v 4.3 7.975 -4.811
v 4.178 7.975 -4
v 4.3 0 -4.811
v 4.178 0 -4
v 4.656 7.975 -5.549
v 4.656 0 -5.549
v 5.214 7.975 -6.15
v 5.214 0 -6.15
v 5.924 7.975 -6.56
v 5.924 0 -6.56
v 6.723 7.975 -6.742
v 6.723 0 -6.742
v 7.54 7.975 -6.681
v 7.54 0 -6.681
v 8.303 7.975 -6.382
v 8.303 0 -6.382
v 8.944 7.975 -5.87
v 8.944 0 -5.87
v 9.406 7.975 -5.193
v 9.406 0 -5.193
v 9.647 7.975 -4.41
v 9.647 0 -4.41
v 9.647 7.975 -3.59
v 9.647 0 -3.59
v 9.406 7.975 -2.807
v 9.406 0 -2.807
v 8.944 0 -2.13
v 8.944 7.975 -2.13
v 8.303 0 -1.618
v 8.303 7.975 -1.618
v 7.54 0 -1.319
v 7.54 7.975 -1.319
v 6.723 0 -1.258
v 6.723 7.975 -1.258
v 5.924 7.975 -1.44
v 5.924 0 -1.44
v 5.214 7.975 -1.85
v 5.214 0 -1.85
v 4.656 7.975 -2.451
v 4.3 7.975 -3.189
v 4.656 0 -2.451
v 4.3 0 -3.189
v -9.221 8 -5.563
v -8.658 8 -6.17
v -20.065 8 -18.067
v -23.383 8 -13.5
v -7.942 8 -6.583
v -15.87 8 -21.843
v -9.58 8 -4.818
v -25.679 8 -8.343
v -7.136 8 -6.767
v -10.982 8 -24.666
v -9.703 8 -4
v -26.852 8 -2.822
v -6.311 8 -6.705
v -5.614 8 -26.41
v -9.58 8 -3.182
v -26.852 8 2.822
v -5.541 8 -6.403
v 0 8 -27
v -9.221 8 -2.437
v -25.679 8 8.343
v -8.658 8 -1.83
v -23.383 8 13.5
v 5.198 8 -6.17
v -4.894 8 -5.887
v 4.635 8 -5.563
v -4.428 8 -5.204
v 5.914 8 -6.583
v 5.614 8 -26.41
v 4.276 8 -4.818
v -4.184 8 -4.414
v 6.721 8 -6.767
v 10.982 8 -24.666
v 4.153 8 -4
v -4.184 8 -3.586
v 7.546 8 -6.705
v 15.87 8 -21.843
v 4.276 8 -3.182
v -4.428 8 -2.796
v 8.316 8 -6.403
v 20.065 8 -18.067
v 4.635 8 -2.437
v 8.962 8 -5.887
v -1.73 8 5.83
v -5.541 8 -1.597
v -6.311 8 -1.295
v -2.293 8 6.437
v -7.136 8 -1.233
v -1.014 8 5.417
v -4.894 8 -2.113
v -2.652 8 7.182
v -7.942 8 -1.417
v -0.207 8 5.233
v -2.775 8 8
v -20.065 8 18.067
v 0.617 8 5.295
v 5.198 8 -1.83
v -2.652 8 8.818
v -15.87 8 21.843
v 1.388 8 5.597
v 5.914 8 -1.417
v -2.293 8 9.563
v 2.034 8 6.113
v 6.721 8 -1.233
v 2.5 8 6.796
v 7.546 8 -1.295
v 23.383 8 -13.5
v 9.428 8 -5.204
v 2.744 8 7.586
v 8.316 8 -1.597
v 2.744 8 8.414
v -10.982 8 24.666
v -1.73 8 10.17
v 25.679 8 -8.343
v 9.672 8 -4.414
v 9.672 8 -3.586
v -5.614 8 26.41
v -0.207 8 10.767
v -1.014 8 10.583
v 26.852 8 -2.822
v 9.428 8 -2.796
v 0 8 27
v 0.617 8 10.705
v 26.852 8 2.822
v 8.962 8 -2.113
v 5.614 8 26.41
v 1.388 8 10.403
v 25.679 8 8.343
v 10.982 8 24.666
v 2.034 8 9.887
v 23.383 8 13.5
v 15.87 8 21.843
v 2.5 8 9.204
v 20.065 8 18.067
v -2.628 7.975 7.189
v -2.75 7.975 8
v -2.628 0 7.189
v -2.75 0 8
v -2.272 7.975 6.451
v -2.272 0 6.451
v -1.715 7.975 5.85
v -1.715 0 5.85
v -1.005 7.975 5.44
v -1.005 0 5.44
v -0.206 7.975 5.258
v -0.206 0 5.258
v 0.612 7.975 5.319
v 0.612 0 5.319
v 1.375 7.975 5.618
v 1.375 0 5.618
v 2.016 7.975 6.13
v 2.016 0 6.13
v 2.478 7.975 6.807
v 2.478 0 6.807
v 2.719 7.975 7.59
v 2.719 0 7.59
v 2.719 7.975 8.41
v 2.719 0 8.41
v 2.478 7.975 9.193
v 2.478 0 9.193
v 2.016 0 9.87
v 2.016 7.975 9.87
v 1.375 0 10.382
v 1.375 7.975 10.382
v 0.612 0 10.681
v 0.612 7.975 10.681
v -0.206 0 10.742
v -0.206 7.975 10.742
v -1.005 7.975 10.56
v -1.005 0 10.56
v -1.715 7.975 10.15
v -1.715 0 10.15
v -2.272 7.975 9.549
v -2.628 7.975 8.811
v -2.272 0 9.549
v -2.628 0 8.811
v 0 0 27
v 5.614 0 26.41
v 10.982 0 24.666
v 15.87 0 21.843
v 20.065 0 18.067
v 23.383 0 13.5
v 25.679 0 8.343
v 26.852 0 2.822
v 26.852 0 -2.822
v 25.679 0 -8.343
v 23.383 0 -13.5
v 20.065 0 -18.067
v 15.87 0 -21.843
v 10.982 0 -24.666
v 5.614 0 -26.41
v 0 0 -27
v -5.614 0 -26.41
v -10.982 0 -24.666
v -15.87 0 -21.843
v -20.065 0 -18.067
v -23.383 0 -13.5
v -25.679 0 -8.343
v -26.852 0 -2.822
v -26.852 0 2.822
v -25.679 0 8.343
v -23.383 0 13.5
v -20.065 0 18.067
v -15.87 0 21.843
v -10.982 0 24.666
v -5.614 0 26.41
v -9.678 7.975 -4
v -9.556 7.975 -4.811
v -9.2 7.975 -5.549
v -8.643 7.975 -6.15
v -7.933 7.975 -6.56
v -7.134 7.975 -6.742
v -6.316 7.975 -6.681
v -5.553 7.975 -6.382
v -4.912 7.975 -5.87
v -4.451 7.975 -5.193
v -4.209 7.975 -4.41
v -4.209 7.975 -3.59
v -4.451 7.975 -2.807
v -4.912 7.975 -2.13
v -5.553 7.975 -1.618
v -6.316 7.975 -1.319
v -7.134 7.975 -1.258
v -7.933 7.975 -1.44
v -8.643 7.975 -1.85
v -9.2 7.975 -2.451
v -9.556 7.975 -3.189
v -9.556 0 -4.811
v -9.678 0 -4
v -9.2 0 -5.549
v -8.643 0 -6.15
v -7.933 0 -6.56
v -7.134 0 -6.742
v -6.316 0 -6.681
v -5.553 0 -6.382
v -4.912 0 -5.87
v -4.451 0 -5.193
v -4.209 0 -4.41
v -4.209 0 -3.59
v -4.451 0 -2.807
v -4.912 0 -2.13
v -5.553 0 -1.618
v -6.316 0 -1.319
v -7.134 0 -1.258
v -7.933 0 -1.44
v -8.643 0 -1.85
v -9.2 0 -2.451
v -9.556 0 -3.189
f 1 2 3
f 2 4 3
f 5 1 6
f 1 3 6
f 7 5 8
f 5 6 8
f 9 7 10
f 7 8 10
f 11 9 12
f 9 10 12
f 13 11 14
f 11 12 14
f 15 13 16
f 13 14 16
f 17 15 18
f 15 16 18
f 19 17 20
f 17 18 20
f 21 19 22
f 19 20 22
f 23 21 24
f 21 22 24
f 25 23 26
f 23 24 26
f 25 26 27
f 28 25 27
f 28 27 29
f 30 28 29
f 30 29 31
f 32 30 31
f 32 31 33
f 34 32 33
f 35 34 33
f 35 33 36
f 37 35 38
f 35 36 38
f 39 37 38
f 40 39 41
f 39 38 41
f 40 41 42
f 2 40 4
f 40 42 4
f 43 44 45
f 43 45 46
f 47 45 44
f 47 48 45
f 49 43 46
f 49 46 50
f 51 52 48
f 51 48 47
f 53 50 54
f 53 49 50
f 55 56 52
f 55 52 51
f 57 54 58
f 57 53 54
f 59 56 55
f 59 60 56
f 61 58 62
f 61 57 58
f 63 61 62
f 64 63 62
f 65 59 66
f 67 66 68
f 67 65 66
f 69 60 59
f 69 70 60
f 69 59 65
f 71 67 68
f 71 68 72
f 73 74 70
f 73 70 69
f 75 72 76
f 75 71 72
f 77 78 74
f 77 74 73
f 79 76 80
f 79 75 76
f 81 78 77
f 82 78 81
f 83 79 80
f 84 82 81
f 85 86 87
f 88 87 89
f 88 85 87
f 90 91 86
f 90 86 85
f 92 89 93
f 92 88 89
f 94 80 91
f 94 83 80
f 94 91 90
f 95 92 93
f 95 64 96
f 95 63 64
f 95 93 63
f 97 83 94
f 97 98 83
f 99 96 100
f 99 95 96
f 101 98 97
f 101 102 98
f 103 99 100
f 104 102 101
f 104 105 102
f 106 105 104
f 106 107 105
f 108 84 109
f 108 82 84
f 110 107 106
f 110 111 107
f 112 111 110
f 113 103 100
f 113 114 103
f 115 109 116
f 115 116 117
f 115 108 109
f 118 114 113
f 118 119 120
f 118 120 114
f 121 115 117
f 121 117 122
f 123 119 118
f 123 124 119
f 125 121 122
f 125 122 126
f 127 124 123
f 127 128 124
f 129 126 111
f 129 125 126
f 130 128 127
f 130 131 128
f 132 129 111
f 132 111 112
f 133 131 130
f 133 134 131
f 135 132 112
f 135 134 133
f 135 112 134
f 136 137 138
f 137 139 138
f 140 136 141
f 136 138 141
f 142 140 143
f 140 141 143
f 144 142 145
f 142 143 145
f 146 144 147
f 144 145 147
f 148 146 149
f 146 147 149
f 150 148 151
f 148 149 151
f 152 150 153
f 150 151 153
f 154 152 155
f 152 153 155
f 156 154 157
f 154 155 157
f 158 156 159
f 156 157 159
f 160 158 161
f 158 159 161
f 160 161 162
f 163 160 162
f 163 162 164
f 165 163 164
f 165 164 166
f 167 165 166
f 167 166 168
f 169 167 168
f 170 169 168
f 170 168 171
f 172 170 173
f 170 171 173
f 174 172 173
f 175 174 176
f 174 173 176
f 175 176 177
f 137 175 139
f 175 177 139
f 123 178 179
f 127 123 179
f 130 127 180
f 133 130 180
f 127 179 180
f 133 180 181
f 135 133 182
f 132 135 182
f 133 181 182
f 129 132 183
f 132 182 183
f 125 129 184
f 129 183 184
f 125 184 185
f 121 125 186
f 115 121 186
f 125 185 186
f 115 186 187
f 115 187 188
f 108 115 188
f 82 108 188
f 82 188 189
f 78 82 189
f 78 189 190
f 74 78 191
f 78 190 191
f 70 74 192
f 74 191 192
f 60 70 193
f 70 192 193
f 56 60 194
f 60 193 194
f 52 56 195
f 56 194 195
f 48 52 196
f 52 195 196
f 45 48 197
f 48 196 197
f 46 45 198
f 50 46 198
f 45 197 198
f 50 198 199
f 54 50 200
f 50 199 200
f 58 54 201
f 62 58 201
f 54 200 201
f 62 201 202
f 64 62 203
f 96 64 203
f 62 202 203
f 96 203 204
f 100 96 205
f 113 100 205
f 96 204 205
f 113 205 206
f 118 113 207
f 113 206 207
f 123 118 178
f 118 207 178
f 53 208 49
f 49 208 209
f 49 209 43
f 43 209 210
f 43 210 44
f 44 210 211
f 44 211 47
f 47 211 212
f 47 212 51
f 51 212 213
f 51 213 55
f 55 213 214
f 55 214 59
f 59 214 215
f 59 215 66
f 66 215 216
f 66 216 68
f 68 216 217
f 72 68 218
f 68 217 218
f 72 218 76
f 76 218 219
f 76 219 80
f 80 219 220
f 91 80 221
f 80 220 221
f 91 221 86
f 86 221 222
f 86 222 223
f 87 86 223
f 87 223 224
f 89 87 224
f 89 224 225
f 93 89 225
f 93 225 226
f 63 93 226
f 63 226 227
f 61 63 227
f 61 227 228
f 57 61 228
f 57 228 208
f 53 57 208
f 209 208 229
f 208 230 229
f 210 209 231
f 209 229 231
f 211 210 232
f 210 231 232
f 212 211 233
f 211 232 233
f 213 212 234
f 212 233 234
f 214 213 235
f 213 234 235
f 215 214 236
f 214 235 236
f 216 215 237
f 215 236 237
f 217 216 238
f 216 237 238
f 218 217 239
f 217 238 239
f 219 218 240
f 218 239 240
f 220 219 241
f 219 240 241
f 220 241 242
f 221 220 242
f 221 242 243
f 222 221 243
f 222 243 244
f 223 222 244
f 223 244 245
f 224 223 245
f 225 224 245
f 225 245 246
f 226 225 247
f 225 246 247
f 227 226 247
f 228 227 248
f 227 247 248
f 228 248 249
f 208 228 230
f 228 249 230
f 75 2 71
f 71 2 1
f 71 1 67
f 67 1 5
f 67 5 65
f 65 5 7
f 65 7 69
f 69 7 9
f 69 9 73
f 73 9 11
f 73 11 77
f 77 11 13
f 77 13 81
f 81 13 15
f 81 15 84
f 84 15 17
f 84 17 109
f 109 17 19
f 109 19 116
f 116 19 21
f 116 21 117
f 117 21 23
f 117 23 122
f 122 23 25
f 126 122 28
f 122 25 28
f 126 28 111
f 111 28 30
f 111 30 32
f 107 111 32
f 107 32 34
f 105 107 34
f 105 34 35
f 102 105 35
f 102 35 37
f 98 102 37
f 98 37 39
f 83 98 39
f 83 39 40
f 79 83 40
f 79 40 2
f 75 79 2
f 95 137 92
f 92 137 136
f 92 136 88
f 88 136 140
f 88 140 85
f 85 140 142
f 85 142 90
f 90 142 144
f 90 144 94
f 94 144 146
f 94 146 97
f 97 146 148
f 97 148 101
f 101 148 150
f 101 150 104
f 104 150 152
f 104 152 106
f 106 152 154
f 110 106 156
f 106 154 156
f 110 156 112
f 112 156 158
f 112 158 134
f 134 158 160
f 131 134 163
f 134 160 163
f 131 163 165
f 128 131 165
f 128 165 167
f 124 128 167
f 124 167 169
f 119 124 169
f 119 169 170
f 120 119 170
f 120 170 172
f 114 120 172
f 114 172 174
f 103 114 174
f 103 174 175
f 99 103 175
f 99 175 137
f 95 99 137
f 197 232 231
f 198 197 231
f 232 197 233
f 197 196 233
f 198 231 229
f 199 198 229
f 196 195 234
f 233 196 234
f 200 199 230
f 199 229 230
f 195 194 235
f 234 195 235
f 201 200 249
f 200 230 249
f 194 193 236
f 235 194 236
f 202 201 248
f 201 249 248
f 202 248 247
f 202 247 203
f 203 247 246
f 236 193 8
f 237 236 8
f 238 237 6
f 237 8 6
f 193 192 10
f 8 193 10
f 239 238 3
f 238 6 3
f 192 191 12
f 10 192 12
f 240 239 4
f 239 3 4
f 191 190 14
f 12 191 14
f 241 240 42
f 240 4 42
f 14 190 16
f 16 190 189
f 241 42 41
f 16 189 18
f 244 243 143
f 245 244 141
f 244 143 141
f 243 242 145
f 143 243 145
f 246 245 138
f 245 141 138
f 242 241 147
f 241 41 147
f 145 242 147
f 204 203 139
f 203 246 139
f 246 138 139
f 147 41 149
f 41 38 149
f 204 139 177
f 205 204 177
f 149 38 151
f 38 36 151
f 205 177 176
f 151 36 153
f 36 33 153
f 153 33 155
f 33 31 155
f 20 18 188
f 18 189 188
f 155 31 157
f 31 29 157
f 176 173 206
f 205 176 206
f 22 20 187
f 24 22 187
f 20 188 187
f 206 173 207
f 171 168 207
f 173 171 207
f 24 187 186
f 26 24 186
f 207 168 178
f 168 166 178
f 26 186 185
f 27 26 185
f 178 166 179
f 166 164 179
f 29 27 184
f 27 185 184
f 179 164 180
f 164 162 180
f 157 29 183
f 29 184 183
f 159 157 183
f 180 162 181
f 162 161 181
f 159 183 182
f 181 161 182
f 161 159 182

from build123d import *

# Parameters (mm, degrees)
SKETCH1_R                      = 27
BOSS_EXTRUDE1_DEPTH            = 8
M5_CLEARANCE_HOLE1_D           = 5.5
M5_CLEARANCE_HOLE1_CSINK_D     = 5.55
M5_CLEARANCE_HOLE1_CSINK_ANGLE = 90


with BuildPart() as part:
    # Sketch1 → Boss-Extrude1 (new body)
    with BuildSketch(Plane(origin=(0, 0, 0), x_dir=(1, 0, 0), z_dir=(0, 1, 0))):
        with Locations(Location((0, 0, 0), (0, 0, 270))):
            Circle(SKETCH1_R)
    extrude(amount=BOSS_EXTRUDE1_DEPTH)

    # M5 Clearance Hole1 (through all)
    with Locations(Plane(origin=(0, 8, 0), x_dir=(1, 0, 0), z_dir=(0, 1, 0))):
        with Locations((-6.92820323, 4), (6.92820323, 4), (0, -8)):
            CounterSinkHole(M5_CLEARANCE_HOLE1_D / 2, M5_CLEARANCE_HOLE1_CSINK_D / 2, counter_sink_angle=M5_CLEARANCE_HOLE1_CSINK_ANGLE)


solid = part.part
